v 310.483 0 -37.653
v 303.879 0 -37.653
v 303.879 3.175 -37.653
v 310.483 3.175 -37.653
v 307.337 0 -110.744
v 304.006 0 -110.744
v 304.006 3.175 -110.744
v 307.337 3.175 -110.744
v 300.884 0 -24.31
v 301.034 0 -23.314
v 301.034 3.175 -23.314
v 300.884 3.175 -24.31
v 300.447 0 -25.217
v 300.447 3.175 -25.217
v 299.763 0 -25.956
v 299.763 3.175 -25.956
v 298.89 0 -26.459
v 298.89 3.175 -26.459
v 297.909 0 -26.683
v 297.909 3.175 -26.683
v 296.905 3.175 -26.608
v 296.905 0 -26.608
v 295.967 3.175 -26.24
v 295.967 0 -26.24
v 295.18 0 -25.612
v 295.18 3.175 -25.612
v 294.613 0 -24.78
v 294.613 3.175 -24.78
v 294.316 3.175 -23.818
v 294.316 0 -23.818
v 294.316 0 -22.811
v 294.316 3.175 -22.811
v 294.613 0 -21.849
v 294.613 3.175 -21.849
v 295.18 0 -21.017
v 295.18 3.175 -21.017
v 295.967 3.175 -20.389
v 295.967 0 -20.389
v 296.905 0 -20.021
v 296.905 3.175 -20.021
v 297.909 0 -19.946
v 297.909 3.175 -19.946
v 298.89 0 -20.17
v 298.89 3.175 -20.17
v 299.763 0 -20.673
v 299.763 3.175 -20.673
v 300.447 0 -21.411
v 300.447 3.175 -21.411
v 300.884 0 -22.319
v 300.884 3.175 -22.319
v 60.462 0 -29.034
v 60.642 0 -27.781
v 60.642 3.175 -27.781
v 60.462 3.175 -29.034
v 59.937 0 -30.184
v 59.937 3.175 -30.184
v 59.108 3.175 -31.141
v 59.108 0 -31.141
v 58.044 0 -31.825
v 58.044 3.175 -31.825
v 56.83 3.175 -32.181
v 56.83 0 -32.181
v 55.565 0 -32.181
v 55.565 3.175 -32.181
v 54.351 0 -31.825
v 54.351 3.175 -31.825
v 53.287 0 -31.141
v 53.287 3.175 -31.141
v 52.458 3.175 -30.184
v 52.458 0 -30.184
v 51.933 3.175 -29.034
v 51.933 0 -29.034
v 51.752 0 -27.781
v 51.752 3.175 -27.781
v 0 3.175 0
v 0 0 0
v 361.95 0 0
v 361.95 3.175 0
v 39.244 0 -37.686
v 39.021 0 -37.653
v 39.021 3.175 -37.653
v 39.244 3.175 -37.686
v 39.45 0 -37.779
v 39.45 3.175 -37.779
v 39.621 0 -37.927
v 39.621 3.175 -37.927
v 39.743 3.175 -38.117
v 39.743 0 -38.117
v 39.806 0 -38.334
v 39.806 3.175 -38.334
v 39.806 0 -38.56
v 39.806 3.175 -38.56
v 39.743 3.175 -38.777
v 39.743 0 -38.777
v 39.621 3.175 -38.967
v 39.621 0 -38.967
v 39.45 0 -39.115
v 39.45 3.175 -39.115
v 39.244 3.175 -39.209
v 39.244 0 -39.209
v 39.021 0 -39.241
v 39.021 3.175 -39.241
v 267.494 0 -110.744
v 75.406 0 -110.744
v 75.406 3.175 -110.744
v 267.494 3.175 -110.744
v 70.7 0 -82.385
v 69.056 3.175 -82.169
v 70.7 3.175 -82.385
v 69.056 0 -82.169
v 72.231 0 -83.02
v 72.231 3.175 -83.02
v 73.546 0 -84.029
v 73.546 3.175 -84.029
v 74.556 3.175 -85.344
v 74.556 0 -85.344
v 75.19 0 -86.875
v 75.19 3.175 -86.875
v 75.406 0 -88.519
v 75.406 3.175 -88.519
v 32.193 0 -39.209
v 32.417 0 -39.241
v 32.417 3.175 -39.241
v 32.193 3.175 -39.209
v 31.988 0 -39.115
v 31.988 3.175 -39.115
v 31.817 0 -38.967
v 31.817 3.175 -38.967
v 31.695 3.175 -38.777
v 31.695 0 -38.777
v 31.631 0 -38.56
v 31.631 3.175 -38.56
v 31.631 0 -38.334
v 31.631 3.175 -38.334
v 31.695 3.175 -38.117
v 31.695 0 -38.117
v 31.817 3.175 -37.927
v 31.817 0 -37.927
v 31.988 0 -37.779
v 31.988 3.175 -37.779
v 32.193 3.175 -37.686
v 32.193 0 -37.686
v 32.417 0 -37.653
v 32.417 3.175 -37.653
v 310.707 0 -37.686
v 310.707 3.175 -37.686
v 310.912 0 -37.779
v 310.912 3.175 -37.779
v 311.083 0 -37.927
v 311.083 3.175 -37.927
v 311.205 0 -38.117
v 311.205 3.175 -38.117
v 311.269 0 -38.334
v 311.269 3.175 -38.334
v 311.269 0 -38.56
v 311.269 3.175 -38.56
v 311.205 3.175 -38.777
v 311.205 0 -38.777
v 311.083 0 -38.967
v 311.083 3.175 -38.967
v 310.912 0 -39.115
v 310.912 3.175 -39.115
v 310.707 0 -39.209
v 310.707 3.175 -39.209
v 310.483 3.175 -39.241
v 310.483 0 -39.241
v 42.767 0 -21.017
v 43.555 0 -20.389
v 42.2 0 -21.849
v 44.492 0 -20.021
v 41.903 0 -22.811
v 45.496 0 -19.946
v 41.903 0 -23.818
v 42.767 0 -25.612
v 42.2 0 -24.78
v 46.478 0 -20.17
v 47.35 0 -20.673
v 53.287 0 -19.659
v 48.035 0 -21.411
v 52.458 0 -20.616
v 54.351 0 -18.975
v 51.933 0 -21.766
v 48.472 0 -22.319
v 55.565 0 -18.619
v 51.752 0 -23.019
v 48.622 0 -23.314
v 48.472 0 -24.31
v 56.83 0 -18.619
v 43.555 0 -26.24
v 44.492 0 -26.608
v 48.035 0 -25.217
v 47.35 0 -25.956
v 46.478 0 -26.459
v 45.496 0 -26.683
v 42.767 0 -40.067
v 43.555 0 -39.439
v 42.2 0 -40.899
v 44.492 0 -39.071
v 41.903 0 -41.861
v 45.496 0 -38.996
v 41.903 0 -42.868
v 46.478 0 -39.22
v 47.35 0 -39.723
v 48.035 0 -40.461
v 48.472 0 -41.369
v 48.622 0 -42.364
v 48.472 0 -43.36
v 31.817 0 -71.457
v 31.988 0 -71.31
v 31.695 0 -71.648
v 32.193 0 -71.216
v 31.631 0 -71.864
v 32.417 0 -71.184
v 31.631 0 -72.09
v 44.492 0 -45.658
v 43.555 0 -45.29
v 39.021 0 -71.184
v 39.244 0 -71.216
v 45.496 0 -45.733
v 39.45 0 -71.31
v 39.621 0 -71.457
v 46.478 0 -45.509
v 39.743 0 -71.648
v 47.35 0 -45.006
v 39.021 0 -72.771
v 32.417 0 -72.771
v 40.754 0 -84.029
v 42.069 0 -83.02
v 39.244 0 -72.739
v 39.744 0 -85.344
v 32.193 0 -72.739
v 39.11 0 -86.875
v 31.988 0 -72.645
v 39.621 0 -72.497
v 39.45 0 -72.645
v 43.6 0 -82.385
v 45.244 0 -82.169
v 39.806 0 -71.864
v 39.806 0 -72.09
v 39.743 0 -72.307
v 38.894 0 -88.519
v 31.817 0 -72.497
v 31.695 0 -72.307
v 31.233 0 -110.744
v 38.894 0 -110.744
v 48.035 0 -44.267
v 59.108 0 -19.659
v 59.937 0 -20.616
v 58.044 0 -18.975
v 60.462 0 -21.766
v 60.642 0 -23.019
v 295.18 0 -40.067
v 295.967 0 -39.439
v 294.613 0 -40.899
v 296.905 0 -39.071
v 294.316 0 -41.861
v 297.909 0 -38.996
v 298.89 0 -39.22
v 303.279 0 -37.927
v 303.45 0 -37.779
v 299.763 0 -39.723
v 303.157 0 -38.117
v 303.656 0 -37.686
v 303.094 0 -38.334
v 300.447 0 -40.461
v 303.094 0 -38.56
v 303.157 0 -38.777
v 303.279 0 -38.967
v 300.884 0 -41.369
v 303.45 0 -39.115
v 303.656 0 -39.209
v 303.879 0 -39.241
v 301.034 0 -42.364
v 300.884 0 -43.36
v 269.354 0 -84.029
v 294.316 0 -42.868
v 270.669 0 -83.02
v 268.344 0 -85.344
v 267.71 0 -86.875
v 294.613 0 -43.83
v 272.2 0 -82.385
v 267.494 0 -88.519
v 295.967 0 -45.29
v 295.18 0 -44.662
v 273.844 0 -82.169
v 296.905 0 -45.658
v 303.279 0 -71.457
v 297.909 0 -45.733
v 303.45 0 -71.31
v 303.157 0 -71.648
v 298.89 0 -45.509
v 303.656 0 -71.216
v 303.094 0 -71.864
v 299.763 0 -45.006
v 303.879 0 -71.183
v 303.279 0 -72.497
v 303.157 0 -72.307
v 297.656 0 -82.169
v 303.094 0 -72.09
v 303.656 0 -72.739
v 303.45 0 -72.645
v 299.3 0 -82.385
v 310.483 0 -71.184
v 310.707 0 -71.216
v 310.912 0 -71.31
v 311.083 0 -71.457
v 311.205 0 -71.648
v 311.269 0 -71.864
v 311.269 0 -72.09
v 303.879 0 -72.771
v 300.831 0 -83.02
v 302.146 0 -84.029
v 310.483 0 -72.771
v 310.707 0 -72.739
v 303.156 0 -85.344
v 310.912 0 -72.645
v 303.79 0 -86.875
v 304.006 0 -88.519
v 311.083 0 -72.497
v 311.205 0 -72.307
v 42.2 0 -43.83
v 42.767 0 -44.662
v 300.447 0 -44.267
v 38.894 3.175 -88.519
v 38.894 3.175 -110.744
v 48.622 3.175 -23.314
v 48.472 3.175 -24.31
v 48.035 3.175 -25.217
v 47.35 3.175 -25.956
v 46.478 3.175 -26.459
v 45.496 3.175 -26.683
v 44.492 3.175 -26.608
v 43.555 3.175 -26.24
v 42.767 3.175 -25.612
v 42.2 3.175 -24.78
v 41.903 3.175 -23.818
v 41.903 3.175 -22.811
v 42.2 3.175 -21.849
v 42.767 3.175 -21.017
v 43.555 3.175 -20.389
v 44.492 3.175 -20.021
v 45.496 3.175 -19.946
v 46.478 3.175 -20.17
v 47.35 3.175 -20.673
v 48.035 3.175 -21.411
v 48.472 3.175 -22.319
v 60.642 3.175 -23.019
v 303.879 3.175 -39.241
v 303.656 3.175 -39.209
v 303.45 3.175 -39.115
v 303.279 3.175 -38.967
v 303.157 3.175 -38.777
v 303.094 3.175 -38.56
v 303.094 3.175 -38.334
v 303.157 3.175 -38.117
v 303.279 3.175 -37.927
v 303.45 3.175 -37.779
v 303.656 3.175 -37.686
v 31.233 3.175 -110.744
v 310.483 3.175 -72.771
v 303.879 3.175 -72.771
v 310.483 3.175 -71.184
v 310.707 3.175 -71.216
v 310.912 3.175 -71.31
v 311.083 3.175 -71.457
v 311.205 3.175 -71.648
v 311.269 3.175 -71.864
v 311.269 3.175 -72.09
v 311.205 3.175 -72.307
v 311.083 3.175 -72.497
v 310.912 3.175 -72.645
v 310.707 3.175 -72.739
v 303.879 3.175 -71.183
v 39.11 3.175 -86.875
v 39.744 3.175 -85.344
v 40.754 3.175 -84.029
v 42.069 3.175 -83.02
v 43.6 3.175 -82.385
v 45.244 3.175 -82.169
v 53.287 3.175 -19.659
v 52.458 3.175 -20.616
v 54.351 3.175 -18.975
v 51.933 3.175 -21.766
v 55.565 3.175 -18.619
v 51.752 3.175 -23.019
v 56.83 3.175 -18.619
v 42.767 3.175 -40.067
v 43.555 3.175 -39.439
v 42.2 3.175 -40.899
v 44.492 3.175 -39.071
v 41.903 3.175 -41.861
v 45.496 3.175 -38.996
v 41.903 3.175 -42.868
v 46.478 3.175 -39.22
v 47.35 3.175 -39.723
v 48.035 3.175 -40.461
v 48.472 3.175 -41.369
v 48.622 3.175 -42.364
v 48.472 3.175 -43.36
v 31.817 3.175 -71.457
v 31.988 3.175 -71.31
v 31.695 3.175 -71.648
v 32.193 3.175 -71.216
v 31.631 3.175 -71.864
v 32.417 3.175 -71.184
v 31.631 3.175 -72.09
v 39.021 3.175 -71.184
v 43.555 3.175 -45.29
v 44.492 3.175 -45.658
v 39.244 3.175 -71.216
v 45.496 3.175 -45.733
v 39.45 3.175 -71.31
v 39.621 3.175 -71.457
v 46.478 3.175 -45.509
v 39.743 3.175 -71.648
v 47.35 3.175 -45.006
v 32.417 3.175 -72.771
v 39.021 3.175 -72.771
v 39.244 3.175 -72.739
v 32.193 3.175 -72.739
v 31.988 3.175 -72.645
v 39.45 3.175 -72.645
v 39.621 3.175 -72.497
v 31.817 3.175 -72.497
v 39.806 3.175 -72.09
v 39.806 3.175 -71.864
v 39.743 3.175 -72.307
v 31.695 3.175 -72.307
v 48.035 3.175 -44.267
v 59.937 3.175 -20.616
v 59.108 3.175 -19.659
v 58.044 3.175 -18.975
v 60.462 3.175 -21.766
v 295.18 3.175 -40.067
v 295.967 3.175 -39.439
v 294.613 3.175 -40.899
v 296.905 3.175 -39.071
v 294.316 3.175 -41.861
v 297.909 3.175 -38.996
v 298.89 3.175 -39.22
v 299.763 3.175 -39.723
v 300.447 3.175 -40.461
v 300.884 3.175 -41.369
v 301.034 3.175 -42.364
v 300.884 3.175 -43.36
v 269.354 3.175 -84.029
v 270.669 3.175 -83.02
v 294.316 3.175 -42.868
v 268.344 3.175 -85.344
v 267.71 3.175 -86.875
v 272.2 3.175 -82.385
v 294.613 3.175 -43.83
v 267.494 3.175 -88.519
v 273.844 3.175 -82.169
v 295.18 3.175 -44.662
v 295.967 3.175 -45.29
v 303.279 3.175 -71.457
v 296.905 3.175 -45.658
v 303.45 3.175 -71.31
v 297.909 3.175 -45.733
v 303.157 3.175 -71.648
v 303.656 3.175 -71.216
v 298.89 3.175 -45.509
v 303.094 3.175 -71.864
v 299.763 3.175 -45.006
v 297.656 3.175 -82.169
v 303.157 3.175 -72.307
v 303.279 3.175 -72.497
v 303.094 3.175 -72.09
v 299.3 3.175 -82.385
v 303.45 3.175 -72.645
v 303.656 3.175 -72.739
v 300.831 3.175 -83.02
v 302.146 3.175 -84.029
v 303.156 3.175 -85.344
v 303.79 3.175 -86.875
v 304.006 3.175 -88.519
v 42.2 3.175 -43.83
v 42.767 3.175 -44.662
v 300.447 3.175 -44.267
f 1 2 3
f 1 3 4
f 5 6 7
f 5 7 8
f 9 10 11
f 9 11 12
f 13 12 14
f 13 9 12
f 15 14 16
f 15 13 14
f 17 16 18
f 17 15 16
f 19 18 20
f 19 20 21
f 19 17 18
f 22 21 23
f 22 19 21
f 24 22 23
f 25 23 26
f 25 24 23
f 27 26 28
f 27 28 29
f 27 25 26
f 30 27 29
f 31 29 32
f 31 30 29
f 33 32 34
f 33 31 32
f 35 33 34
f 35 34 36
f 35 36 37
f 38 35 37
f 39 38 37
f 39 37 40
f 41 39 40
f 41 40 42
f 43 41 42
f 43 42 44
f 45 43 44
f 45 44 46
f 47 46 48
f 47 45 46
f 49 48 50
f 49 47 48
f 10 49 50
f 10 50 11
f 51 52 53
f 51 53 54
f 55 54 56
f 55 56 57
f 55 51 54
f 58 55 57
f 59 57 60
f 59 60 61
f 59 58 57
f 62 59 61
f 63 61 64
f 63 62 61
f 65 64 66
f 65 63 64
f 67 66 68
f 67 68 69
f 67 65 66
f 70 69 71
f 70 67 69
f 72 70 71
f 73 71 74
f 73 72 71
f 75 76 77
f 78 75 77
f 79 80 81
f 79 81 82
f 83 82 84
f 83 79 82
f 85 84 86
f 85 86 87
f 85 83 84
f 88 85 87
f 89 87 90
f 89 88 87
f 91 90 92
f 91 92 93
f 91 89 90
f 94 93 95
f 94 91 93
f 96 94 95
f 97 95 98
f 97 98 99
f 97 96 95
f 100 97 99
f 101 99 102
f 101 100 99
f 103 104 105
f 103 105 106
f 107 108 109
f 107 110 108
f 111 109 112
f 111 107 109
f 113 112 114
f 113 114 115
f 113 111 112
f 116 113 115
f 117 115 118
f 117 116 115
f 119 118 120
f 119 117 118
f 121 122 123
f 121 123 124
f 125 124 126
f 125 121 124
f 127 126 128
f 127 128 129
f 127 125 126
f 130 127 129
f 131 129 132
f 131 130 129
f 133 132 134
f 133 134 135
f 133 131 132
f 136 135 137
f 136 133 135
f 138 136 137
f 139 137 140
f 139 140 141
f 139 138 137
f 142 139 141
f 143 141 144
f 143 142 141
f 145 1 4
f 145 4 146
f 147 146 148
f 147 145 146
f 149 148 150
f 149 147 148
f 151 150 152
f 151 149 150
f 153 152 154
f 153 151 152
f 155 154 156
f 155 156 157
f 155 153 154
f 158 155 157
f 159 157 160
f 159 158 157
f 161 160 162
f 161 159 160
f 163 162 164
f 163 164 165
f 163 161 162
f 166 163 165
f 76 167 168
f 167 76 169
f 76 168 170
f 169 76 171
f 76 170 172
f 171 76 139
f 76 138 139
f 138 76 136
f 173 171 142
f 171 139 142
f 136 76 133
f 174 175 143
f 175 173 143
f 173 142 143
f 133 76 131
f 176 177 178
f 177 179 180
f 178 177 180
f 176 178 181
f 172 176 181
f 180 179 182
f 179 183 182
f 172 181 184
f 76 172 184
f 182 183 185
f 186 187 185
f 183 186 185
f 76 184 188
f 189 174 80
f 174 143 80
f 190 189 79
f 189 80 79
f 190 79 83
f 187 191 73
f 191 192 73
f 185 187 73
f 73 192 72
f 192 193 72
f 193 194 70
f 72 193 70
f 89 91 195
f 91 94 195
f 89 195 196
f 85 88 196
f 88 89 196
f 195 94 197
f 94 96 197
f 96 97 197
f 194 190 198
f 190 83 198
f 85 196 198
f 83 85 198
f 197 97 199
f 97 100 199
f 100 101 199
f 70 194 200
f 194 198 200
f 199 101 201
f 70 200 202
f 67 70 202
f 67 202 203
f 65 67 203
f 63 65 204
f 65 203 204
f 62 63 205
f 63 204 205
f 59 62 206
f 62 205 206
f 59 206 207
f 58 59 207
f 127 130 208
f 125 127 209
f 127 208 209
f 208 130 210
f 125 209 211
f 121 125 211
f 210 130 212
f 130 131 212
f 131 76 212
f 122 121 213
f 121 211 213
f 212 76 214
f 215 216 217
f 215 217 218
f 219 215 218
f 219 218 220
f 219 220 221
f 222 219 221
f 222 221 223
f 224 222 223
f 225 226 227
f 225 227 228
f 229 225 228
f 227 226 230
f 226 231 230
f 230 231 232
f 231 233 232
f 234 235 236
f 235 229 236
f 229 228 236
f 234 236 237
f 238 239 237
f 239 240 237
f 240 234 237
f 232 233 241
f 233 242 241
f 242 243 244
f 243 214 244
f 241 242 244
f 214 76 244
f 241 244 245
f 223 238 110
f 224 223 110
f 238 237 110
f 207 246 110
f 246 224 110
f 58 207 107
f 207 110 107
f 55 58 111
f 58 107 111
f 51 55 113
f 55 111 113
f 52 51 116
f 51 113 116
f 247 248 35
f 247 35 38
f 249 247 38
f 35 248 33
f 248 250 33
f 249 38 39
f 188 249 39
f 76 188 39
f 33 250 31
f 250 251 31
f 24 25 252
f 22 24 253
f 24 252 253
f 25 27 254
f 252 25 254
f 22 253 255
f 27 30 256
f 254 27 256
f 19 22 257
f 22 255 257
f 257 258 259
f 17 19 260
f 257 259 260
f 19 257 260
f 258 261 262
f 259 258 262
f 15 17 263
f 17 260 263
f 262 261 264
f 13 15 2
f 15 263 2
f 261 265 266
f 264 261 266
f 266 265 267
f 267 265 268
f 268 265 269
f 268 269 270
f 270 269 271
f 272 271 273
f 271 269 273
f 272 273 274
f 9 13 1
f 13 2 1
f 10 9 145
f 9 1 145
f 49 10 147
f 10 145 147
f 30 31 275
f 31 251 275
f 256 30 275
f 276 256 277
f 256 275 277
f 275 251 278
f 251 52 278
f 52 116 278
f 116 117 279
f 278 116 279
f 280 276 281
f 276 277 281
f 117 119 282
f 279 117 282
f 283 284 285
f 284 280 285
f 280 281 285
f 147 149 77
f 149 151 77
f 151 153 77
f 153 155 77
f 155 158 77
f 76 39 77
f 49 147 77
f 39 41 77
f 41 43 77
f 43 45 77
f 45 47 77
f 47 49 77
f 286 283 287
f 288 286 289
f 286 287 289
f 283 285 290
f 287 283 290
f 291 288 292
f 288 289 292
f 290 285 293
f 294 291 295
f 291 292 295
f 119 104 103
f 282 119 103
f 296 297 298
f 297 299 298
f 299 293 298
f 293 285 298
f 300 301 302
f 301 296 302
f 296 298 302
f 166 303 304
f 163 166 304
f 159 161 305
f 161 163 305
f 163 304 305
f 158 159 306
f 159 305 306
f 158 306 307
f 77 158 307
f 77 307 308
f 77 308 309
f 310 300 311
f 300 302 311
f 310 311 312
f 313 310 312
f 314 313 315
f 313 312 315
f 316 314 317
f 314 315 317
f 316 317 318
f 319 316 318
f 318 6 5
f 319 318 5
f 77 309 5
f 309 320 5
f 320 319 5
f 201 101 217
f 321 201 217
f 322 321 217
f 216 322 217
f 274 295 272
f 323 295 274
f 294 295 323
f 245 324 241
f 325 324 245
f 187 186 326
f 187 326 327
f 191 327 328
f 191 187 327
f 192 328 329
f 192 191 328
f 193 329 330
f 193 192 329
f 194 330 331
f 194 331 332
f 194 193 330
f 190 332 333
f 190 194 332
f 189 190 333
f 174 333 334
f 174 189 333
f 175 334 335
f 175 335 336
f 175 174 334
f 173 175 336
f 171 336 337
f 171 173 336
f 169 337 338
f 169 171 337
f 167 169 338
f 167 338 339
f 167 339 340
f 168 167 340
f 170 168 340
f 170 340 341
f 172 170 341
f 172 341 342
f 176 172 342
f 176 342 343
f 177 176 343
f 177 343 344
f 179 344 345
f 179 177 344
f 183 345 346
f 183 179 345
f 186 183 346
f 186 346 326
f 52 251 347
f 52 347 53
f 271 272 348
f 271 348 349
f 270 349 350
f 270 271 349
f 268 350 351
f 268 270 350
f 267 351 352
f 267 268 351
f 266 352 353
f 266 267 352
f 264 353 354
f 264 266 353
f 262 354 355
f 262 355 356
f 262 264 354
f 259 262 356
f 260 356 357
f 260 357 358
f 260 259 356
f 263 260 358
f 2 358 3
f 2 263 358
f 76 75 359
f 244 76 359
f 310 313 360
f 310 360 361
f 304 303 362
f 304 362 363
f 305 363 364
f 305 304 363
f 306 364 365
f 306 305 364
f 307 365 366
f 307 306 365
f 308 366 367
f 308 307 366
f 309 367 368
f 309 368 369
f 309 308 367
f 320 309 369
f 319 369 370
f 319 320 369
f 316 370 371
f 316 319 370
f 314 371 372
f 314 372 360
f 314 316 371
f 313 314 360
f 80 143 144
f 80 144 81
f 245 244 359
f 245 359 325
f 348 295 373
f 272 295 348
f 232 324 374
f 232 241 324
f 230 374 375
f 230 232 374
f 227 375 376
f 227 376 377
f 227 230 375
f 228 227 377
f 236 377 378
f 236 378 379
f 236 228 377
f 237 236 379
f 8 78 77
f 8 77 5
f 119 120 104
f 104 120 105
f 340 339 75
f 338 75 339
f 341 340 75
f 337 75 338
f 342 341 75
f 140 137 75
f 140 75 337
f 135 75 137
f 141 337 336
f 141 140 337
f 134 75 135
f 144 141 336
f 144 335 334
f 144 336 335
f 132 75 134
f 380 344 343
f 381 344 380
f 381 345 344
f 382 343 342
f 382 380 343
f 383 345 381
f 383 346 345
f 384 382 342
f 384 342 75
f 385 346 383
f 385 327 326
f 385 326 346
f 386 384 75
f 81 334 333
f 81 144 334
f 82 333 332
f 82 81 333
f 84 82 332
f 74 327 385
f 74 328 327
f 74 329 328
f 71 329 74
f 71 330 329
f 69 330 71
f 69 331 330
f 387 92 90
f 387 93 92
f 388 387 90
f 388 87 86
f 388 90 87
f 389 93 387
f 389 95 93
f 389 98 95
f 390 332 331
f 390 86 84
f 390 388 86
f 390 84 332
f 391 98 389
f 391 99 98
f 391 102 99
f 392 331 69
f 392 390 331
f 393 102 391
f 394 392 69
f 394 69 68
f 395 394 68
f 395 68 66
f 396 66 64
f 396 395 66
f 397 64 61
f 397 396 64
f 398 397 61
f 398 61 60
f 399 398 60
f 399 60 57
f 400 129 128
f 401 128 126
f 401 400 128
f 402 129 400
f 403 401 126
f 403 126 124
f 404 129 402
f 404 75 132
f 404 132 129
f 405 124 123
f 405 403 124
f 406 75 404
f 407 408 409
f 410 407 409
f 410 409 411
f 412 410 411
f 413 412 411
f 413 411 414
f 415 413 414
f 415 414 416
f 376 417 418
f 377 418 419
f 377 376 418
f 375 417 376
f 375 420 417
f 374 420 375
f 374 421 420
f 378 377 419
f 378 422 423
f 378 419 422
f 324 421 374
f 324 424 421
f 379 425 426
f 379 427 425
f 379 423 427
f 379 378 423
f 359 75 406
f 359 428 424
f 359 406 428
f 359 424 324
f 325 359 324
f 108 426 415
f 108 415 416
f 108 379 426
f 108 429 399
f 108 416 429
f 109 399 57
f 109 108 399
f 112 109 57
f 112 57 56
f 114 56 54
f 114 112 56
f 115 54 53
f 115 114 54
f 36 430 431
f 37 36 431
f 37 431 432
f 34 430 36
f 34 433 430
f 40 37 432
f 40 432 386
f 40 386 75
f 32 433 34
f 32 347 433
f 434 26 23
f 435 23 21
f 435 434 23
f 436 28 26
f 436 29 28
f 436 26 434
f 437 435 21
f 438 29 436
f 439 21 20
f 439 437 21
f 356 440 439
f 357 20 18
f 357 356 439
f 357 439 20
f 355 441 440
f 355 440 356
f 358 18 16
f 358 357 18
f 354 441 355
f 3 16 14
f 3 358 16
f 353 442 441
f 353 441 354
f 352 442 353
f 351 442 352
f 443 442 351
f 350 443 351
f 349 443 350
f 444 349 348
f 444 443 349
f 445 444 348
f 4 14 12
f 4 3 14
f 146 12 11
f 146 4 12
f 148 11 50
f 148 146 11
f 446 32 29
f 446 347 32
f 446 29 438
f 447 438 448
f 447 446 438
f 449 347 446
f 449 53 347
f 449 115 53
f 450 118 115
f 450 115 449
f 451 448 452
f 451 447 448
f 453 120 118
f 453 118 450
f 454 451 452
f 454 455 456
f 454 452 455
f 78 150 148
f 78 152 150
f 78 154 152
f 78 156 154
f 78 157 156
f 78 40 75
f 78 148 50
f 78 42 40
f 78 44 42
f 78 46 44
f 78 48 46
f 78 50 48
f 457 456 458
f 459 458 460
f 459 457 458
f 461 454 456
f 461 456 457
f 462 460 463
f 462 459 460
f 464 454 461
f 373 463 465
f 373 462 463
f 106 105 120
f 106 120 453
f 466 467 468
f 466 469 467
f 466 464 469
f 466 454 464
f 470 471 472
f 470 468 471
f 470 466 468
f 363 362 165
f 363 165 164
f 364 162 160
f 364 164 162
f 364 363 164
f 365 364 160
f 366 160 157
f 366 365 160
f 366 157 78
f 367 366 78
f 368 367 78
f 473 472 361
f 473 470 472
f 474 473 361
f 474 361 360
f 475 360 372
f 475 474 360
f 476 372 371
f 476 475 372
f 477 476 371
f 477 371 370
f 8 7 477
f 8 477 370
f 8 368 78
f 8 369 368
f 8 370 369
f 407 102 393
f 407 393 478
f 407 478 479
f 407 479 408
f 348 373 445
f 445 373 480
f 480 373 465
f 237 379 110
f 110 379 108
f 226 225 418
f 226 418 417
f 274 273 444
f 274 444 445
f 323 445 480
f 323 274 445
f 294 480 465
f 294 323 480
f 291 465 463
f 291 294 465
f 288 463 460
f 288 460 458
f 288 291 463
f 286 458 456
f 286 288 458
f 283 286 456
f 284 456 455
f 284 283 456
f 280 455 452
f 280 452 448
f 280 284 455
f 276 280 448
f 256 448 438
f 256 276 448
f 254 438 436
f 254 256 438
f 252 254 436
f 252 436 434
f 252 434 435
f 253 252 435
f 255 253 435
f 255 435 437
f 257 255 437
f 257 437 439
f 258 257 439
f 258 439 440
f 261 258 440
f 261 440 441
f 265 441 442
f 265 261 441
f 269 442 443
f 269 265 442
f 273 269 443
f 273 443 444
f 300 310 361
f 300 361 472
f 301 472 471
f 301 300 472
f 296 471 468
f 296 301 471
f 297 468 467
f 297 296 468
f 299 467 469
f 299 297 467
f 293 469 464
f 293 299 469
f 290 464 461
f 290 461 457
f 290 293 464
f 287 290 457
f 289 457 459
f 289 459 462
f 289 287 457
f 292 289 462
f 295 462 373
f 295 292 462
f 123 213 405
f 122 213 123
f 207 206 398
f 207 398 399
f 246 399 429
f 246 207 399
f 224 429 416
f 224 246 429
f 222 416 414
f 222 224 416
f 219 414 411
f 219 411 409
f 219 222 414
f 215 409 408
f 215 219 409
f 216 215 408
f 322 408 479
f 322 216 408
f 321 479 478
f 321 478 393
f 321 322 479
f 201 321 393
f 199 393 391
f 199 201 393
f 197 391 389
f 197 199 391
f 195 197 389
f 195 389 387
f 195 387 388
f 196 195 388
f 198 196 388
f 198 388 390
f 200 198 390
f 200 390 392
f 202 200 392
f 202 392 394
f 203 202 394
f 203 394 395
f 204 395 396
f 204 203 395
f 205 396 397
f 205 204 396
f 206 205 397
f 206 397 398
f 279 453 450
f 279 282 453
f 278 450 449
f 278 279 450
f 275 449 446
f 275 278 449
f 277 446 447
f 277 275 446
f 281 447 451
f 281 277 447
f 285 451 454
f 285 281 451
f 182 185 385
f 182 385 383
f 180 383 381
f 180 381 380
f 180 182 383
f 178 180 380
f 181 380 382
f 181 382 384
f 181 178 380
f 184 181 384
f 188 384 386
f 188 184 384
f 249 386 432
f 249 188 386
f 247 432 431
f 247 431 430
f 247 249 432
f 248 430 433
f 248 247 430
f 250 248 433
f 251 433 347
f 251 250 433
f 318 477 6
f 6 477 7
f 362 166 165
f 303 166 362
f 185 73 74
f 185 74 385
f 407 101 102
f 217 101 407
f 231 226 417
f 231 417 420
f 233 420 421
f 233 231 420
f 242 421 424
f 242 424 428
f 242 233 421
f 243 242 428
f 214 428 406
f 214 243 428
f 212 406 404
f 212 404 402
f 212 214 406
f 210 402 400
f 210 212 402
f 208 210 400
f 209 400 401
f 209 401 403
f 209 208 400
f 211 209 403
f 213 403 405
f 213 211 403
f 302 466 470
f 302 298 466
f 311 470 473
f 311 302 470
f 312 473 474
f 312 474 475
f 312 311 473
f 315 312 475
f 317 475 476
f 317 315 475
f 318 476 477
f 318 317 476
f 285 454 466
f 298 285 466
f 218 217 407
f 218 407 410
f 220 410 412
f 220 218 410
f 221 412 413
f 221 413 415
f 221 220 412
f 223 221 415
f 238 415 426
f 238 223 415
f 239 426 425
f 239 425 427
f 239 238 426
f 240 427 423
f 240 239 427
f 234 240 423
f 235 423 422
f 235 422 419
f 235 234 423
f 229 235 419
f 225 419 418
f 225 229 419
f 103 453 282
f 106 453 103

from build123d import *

# Parameters (mm, degrees)
SKETCH1_W                       = 361.95
SKETCH1_H                       = 110.744
BOSS_EXTRUDE1_DEPTH             = 3.175
CUT_EXTRUDE1_DEPTH              = 379.526243028
SKETCH3_W                       = 36.5125
SKETCH3_H                       = 28.575
CUT_EXTRUDE2_DEPTH              = 379.526243028
FILLET1_R                       = 6.35
F_1_4_CLEARANCE_HOLE1_OUTLINE_R = 3.3782
F_1_4_CLEARANCE_HOLE1_DEPTH     = 3.175
CUT_EXTRUDE6_DEPTH              = 3.175


# Read off the part's stored shape, not the designer's step: 1/4 Clearance Hole1, Cut-Extrude6
with BuildPart() as part:
    # Sketch1 → Boss-Extrude1 (new body)
    with BuildSketch(Plane(origin=(0, 0, 0), x_dir=(1, 0, 0), z_dir=(0, 1, 0))):
        with Locations((180.975, 55.372)):
            Rectangle(SKETCH1_W, SKETCH1_H)
    extrude(amount=BOSS_EXTRUDE1_DEPTH)

    # Sketch2 → Cut-Extrude1 (cut, through all)
    with BuildSketch(Plane(origin=(0, 3.175, 0), x_dir=(1, 0, 0), z_dir=(0, 1, 0))):
        Polygon((0, 0), (31.233038214, 110.744), (0, 110.744), align=None)
        Polygon((361.95, 0), (307.33710294, 110.744), (361.95, 110.744), align=None)
    extrude(amount=-CUT_EXTRUDE1_DEPTH, mode=Mode.SUBTRACT)

    # Sketch3 → Cut-Extrude2 (cut, through all)
    with BuildSketch(Plane(origin=(0, 3.175, 0), x_dir=(1, 0, 0), z_dir=(0, 1, 0))):
        with Locations((57.15, 96.4565)):
            Rectangle(SKETCH3_W, SKETCH3_H)
        with Locations((285.75, 96.4565)):
            Rectangle(SKETCH3_W, SKETCH3_H)
    extrude(amount=-CUT_EXTRUDE2_DEPTH, mode=Mode.SUBTRACT)

    # Fillet1
    fillet1_edges = [part.edges().sort_by_distance(p)[0] for p in [
        (75.40625, 1.5875, -82.169),
        (38.89375, 1.5875, -82.169),
        (304.00625, 1.5875, -82.169),
        (267.49375, 1.5875, -82.169),
    ]]
    fillet(fillet1_edges, radius=FILLET1_R)

    # 1/4 Clearance Hole1 outline → 1/4 Clearance Hole1 (cut)
    with BuildSketch(Plane(origin=(0, 0, 0), x_dir=(1, 0, 0), z_dir=(0, 1, 0))):
        with BuildLine():
            ThreePointArc((51.7525, 23.01875), (56.1975, 18.57375), (60.6425, 23.01875))
            Line((60.6425, 23.01875), (60.6425, 27.78125))
            ThreePointArc((60.6425, 27.78125), (56.1975, 32.22625), (51.7525, 27.78125))
            Line((51.7525, 27.78125), (51.7525, 23.01875))
        make_face()
        with Locations((297.65625, 23.314421689)):
            Circle(F_1_4_CLEARANCE_HOLE1_OUTLINE_R)
        with Locations((297.65625, 42.364421689)):
            Circle(F_1_4_CLEARANCE_HOLE1_OUTLINE_R)
        with Locations((45.24375, 23.314421689)):
            Circle(F_1_4_CLEARANCE_HOLE1_OUTLINE_R)
        with Locations((45.24375, 42.364421689)):
            Circle(F_1_4_CLEARANCE_HOLE1_OUTLINE_R)
    extrude(amount=F_1_4_CLEARANCE_HOLE1_DEPTH, mode=Mode.SUBTRACT)

    # Cut-Extrude6 outline → Cut-Extrude6 (cut)
    with BuildSketch(Plane(origin=(0, 0, 0), x_dir=(1, 0, 0), z_dir=(0, 1, 0))):
        with BuildLine():
            ThreePointArc((39.02075, 71.1835), (39.8145, 71.97725), (39.02075, 72.771))
            Line((39.02075, 72.771), (32.41675, 72.771))
            ThreePointArc((32.41675, 72.771), (31.623, 71.97725), (32.41675, 71.1835))
            Line((32.41675, 71.1835), (32.41675, 39.240862815))
            ThreePointArc((32.41675, 39.240862815), (31.623, 38.447112815), (32.41675, 37.653362815))
            Line((32.41675, 37.653362815), (39.02075, 37.653362815))
            ThreePointArc((39.02075, 37.653362815), (39.8145, 38.447112815), (39.02075, 39.240862815))
            Line((39.02075, 39.240862815), (39.02075, 71.1835))
        make_face()
        with BuildLine():
            ThreePointArc((310.48325, 71.1835), (311.277, 71.97725), (310.48325, 72.771))
            Line((310.48325, 72.771), (303.87925, 72.771))
            ThreePointArc((303.87925, 72.771), (303.0855, 71.97725), (303.87925, 71.1835))
            Line((303.87925, 71.1835), (303.87925, 39.240862815))
            ThreePointArc((303.87925, 39.240862815), (303.0855, 38.447112815), (303.87925, 37.653362815))
            Line((303.87925, 37.653362815), (310.48325, 37.653362815))
            ThreePointArc((310.48325, 37.653362815), (311.277, 38.447112815), (310.48325, 39.240862815))
            Line((310.48325, 39.240862815), (310.48325, 71.1835))
        make_face()
    extrude(amount=CUT_EXTRUDE6_DEPTH, mode=Mode.SUBTRACT)


solid = part.part
